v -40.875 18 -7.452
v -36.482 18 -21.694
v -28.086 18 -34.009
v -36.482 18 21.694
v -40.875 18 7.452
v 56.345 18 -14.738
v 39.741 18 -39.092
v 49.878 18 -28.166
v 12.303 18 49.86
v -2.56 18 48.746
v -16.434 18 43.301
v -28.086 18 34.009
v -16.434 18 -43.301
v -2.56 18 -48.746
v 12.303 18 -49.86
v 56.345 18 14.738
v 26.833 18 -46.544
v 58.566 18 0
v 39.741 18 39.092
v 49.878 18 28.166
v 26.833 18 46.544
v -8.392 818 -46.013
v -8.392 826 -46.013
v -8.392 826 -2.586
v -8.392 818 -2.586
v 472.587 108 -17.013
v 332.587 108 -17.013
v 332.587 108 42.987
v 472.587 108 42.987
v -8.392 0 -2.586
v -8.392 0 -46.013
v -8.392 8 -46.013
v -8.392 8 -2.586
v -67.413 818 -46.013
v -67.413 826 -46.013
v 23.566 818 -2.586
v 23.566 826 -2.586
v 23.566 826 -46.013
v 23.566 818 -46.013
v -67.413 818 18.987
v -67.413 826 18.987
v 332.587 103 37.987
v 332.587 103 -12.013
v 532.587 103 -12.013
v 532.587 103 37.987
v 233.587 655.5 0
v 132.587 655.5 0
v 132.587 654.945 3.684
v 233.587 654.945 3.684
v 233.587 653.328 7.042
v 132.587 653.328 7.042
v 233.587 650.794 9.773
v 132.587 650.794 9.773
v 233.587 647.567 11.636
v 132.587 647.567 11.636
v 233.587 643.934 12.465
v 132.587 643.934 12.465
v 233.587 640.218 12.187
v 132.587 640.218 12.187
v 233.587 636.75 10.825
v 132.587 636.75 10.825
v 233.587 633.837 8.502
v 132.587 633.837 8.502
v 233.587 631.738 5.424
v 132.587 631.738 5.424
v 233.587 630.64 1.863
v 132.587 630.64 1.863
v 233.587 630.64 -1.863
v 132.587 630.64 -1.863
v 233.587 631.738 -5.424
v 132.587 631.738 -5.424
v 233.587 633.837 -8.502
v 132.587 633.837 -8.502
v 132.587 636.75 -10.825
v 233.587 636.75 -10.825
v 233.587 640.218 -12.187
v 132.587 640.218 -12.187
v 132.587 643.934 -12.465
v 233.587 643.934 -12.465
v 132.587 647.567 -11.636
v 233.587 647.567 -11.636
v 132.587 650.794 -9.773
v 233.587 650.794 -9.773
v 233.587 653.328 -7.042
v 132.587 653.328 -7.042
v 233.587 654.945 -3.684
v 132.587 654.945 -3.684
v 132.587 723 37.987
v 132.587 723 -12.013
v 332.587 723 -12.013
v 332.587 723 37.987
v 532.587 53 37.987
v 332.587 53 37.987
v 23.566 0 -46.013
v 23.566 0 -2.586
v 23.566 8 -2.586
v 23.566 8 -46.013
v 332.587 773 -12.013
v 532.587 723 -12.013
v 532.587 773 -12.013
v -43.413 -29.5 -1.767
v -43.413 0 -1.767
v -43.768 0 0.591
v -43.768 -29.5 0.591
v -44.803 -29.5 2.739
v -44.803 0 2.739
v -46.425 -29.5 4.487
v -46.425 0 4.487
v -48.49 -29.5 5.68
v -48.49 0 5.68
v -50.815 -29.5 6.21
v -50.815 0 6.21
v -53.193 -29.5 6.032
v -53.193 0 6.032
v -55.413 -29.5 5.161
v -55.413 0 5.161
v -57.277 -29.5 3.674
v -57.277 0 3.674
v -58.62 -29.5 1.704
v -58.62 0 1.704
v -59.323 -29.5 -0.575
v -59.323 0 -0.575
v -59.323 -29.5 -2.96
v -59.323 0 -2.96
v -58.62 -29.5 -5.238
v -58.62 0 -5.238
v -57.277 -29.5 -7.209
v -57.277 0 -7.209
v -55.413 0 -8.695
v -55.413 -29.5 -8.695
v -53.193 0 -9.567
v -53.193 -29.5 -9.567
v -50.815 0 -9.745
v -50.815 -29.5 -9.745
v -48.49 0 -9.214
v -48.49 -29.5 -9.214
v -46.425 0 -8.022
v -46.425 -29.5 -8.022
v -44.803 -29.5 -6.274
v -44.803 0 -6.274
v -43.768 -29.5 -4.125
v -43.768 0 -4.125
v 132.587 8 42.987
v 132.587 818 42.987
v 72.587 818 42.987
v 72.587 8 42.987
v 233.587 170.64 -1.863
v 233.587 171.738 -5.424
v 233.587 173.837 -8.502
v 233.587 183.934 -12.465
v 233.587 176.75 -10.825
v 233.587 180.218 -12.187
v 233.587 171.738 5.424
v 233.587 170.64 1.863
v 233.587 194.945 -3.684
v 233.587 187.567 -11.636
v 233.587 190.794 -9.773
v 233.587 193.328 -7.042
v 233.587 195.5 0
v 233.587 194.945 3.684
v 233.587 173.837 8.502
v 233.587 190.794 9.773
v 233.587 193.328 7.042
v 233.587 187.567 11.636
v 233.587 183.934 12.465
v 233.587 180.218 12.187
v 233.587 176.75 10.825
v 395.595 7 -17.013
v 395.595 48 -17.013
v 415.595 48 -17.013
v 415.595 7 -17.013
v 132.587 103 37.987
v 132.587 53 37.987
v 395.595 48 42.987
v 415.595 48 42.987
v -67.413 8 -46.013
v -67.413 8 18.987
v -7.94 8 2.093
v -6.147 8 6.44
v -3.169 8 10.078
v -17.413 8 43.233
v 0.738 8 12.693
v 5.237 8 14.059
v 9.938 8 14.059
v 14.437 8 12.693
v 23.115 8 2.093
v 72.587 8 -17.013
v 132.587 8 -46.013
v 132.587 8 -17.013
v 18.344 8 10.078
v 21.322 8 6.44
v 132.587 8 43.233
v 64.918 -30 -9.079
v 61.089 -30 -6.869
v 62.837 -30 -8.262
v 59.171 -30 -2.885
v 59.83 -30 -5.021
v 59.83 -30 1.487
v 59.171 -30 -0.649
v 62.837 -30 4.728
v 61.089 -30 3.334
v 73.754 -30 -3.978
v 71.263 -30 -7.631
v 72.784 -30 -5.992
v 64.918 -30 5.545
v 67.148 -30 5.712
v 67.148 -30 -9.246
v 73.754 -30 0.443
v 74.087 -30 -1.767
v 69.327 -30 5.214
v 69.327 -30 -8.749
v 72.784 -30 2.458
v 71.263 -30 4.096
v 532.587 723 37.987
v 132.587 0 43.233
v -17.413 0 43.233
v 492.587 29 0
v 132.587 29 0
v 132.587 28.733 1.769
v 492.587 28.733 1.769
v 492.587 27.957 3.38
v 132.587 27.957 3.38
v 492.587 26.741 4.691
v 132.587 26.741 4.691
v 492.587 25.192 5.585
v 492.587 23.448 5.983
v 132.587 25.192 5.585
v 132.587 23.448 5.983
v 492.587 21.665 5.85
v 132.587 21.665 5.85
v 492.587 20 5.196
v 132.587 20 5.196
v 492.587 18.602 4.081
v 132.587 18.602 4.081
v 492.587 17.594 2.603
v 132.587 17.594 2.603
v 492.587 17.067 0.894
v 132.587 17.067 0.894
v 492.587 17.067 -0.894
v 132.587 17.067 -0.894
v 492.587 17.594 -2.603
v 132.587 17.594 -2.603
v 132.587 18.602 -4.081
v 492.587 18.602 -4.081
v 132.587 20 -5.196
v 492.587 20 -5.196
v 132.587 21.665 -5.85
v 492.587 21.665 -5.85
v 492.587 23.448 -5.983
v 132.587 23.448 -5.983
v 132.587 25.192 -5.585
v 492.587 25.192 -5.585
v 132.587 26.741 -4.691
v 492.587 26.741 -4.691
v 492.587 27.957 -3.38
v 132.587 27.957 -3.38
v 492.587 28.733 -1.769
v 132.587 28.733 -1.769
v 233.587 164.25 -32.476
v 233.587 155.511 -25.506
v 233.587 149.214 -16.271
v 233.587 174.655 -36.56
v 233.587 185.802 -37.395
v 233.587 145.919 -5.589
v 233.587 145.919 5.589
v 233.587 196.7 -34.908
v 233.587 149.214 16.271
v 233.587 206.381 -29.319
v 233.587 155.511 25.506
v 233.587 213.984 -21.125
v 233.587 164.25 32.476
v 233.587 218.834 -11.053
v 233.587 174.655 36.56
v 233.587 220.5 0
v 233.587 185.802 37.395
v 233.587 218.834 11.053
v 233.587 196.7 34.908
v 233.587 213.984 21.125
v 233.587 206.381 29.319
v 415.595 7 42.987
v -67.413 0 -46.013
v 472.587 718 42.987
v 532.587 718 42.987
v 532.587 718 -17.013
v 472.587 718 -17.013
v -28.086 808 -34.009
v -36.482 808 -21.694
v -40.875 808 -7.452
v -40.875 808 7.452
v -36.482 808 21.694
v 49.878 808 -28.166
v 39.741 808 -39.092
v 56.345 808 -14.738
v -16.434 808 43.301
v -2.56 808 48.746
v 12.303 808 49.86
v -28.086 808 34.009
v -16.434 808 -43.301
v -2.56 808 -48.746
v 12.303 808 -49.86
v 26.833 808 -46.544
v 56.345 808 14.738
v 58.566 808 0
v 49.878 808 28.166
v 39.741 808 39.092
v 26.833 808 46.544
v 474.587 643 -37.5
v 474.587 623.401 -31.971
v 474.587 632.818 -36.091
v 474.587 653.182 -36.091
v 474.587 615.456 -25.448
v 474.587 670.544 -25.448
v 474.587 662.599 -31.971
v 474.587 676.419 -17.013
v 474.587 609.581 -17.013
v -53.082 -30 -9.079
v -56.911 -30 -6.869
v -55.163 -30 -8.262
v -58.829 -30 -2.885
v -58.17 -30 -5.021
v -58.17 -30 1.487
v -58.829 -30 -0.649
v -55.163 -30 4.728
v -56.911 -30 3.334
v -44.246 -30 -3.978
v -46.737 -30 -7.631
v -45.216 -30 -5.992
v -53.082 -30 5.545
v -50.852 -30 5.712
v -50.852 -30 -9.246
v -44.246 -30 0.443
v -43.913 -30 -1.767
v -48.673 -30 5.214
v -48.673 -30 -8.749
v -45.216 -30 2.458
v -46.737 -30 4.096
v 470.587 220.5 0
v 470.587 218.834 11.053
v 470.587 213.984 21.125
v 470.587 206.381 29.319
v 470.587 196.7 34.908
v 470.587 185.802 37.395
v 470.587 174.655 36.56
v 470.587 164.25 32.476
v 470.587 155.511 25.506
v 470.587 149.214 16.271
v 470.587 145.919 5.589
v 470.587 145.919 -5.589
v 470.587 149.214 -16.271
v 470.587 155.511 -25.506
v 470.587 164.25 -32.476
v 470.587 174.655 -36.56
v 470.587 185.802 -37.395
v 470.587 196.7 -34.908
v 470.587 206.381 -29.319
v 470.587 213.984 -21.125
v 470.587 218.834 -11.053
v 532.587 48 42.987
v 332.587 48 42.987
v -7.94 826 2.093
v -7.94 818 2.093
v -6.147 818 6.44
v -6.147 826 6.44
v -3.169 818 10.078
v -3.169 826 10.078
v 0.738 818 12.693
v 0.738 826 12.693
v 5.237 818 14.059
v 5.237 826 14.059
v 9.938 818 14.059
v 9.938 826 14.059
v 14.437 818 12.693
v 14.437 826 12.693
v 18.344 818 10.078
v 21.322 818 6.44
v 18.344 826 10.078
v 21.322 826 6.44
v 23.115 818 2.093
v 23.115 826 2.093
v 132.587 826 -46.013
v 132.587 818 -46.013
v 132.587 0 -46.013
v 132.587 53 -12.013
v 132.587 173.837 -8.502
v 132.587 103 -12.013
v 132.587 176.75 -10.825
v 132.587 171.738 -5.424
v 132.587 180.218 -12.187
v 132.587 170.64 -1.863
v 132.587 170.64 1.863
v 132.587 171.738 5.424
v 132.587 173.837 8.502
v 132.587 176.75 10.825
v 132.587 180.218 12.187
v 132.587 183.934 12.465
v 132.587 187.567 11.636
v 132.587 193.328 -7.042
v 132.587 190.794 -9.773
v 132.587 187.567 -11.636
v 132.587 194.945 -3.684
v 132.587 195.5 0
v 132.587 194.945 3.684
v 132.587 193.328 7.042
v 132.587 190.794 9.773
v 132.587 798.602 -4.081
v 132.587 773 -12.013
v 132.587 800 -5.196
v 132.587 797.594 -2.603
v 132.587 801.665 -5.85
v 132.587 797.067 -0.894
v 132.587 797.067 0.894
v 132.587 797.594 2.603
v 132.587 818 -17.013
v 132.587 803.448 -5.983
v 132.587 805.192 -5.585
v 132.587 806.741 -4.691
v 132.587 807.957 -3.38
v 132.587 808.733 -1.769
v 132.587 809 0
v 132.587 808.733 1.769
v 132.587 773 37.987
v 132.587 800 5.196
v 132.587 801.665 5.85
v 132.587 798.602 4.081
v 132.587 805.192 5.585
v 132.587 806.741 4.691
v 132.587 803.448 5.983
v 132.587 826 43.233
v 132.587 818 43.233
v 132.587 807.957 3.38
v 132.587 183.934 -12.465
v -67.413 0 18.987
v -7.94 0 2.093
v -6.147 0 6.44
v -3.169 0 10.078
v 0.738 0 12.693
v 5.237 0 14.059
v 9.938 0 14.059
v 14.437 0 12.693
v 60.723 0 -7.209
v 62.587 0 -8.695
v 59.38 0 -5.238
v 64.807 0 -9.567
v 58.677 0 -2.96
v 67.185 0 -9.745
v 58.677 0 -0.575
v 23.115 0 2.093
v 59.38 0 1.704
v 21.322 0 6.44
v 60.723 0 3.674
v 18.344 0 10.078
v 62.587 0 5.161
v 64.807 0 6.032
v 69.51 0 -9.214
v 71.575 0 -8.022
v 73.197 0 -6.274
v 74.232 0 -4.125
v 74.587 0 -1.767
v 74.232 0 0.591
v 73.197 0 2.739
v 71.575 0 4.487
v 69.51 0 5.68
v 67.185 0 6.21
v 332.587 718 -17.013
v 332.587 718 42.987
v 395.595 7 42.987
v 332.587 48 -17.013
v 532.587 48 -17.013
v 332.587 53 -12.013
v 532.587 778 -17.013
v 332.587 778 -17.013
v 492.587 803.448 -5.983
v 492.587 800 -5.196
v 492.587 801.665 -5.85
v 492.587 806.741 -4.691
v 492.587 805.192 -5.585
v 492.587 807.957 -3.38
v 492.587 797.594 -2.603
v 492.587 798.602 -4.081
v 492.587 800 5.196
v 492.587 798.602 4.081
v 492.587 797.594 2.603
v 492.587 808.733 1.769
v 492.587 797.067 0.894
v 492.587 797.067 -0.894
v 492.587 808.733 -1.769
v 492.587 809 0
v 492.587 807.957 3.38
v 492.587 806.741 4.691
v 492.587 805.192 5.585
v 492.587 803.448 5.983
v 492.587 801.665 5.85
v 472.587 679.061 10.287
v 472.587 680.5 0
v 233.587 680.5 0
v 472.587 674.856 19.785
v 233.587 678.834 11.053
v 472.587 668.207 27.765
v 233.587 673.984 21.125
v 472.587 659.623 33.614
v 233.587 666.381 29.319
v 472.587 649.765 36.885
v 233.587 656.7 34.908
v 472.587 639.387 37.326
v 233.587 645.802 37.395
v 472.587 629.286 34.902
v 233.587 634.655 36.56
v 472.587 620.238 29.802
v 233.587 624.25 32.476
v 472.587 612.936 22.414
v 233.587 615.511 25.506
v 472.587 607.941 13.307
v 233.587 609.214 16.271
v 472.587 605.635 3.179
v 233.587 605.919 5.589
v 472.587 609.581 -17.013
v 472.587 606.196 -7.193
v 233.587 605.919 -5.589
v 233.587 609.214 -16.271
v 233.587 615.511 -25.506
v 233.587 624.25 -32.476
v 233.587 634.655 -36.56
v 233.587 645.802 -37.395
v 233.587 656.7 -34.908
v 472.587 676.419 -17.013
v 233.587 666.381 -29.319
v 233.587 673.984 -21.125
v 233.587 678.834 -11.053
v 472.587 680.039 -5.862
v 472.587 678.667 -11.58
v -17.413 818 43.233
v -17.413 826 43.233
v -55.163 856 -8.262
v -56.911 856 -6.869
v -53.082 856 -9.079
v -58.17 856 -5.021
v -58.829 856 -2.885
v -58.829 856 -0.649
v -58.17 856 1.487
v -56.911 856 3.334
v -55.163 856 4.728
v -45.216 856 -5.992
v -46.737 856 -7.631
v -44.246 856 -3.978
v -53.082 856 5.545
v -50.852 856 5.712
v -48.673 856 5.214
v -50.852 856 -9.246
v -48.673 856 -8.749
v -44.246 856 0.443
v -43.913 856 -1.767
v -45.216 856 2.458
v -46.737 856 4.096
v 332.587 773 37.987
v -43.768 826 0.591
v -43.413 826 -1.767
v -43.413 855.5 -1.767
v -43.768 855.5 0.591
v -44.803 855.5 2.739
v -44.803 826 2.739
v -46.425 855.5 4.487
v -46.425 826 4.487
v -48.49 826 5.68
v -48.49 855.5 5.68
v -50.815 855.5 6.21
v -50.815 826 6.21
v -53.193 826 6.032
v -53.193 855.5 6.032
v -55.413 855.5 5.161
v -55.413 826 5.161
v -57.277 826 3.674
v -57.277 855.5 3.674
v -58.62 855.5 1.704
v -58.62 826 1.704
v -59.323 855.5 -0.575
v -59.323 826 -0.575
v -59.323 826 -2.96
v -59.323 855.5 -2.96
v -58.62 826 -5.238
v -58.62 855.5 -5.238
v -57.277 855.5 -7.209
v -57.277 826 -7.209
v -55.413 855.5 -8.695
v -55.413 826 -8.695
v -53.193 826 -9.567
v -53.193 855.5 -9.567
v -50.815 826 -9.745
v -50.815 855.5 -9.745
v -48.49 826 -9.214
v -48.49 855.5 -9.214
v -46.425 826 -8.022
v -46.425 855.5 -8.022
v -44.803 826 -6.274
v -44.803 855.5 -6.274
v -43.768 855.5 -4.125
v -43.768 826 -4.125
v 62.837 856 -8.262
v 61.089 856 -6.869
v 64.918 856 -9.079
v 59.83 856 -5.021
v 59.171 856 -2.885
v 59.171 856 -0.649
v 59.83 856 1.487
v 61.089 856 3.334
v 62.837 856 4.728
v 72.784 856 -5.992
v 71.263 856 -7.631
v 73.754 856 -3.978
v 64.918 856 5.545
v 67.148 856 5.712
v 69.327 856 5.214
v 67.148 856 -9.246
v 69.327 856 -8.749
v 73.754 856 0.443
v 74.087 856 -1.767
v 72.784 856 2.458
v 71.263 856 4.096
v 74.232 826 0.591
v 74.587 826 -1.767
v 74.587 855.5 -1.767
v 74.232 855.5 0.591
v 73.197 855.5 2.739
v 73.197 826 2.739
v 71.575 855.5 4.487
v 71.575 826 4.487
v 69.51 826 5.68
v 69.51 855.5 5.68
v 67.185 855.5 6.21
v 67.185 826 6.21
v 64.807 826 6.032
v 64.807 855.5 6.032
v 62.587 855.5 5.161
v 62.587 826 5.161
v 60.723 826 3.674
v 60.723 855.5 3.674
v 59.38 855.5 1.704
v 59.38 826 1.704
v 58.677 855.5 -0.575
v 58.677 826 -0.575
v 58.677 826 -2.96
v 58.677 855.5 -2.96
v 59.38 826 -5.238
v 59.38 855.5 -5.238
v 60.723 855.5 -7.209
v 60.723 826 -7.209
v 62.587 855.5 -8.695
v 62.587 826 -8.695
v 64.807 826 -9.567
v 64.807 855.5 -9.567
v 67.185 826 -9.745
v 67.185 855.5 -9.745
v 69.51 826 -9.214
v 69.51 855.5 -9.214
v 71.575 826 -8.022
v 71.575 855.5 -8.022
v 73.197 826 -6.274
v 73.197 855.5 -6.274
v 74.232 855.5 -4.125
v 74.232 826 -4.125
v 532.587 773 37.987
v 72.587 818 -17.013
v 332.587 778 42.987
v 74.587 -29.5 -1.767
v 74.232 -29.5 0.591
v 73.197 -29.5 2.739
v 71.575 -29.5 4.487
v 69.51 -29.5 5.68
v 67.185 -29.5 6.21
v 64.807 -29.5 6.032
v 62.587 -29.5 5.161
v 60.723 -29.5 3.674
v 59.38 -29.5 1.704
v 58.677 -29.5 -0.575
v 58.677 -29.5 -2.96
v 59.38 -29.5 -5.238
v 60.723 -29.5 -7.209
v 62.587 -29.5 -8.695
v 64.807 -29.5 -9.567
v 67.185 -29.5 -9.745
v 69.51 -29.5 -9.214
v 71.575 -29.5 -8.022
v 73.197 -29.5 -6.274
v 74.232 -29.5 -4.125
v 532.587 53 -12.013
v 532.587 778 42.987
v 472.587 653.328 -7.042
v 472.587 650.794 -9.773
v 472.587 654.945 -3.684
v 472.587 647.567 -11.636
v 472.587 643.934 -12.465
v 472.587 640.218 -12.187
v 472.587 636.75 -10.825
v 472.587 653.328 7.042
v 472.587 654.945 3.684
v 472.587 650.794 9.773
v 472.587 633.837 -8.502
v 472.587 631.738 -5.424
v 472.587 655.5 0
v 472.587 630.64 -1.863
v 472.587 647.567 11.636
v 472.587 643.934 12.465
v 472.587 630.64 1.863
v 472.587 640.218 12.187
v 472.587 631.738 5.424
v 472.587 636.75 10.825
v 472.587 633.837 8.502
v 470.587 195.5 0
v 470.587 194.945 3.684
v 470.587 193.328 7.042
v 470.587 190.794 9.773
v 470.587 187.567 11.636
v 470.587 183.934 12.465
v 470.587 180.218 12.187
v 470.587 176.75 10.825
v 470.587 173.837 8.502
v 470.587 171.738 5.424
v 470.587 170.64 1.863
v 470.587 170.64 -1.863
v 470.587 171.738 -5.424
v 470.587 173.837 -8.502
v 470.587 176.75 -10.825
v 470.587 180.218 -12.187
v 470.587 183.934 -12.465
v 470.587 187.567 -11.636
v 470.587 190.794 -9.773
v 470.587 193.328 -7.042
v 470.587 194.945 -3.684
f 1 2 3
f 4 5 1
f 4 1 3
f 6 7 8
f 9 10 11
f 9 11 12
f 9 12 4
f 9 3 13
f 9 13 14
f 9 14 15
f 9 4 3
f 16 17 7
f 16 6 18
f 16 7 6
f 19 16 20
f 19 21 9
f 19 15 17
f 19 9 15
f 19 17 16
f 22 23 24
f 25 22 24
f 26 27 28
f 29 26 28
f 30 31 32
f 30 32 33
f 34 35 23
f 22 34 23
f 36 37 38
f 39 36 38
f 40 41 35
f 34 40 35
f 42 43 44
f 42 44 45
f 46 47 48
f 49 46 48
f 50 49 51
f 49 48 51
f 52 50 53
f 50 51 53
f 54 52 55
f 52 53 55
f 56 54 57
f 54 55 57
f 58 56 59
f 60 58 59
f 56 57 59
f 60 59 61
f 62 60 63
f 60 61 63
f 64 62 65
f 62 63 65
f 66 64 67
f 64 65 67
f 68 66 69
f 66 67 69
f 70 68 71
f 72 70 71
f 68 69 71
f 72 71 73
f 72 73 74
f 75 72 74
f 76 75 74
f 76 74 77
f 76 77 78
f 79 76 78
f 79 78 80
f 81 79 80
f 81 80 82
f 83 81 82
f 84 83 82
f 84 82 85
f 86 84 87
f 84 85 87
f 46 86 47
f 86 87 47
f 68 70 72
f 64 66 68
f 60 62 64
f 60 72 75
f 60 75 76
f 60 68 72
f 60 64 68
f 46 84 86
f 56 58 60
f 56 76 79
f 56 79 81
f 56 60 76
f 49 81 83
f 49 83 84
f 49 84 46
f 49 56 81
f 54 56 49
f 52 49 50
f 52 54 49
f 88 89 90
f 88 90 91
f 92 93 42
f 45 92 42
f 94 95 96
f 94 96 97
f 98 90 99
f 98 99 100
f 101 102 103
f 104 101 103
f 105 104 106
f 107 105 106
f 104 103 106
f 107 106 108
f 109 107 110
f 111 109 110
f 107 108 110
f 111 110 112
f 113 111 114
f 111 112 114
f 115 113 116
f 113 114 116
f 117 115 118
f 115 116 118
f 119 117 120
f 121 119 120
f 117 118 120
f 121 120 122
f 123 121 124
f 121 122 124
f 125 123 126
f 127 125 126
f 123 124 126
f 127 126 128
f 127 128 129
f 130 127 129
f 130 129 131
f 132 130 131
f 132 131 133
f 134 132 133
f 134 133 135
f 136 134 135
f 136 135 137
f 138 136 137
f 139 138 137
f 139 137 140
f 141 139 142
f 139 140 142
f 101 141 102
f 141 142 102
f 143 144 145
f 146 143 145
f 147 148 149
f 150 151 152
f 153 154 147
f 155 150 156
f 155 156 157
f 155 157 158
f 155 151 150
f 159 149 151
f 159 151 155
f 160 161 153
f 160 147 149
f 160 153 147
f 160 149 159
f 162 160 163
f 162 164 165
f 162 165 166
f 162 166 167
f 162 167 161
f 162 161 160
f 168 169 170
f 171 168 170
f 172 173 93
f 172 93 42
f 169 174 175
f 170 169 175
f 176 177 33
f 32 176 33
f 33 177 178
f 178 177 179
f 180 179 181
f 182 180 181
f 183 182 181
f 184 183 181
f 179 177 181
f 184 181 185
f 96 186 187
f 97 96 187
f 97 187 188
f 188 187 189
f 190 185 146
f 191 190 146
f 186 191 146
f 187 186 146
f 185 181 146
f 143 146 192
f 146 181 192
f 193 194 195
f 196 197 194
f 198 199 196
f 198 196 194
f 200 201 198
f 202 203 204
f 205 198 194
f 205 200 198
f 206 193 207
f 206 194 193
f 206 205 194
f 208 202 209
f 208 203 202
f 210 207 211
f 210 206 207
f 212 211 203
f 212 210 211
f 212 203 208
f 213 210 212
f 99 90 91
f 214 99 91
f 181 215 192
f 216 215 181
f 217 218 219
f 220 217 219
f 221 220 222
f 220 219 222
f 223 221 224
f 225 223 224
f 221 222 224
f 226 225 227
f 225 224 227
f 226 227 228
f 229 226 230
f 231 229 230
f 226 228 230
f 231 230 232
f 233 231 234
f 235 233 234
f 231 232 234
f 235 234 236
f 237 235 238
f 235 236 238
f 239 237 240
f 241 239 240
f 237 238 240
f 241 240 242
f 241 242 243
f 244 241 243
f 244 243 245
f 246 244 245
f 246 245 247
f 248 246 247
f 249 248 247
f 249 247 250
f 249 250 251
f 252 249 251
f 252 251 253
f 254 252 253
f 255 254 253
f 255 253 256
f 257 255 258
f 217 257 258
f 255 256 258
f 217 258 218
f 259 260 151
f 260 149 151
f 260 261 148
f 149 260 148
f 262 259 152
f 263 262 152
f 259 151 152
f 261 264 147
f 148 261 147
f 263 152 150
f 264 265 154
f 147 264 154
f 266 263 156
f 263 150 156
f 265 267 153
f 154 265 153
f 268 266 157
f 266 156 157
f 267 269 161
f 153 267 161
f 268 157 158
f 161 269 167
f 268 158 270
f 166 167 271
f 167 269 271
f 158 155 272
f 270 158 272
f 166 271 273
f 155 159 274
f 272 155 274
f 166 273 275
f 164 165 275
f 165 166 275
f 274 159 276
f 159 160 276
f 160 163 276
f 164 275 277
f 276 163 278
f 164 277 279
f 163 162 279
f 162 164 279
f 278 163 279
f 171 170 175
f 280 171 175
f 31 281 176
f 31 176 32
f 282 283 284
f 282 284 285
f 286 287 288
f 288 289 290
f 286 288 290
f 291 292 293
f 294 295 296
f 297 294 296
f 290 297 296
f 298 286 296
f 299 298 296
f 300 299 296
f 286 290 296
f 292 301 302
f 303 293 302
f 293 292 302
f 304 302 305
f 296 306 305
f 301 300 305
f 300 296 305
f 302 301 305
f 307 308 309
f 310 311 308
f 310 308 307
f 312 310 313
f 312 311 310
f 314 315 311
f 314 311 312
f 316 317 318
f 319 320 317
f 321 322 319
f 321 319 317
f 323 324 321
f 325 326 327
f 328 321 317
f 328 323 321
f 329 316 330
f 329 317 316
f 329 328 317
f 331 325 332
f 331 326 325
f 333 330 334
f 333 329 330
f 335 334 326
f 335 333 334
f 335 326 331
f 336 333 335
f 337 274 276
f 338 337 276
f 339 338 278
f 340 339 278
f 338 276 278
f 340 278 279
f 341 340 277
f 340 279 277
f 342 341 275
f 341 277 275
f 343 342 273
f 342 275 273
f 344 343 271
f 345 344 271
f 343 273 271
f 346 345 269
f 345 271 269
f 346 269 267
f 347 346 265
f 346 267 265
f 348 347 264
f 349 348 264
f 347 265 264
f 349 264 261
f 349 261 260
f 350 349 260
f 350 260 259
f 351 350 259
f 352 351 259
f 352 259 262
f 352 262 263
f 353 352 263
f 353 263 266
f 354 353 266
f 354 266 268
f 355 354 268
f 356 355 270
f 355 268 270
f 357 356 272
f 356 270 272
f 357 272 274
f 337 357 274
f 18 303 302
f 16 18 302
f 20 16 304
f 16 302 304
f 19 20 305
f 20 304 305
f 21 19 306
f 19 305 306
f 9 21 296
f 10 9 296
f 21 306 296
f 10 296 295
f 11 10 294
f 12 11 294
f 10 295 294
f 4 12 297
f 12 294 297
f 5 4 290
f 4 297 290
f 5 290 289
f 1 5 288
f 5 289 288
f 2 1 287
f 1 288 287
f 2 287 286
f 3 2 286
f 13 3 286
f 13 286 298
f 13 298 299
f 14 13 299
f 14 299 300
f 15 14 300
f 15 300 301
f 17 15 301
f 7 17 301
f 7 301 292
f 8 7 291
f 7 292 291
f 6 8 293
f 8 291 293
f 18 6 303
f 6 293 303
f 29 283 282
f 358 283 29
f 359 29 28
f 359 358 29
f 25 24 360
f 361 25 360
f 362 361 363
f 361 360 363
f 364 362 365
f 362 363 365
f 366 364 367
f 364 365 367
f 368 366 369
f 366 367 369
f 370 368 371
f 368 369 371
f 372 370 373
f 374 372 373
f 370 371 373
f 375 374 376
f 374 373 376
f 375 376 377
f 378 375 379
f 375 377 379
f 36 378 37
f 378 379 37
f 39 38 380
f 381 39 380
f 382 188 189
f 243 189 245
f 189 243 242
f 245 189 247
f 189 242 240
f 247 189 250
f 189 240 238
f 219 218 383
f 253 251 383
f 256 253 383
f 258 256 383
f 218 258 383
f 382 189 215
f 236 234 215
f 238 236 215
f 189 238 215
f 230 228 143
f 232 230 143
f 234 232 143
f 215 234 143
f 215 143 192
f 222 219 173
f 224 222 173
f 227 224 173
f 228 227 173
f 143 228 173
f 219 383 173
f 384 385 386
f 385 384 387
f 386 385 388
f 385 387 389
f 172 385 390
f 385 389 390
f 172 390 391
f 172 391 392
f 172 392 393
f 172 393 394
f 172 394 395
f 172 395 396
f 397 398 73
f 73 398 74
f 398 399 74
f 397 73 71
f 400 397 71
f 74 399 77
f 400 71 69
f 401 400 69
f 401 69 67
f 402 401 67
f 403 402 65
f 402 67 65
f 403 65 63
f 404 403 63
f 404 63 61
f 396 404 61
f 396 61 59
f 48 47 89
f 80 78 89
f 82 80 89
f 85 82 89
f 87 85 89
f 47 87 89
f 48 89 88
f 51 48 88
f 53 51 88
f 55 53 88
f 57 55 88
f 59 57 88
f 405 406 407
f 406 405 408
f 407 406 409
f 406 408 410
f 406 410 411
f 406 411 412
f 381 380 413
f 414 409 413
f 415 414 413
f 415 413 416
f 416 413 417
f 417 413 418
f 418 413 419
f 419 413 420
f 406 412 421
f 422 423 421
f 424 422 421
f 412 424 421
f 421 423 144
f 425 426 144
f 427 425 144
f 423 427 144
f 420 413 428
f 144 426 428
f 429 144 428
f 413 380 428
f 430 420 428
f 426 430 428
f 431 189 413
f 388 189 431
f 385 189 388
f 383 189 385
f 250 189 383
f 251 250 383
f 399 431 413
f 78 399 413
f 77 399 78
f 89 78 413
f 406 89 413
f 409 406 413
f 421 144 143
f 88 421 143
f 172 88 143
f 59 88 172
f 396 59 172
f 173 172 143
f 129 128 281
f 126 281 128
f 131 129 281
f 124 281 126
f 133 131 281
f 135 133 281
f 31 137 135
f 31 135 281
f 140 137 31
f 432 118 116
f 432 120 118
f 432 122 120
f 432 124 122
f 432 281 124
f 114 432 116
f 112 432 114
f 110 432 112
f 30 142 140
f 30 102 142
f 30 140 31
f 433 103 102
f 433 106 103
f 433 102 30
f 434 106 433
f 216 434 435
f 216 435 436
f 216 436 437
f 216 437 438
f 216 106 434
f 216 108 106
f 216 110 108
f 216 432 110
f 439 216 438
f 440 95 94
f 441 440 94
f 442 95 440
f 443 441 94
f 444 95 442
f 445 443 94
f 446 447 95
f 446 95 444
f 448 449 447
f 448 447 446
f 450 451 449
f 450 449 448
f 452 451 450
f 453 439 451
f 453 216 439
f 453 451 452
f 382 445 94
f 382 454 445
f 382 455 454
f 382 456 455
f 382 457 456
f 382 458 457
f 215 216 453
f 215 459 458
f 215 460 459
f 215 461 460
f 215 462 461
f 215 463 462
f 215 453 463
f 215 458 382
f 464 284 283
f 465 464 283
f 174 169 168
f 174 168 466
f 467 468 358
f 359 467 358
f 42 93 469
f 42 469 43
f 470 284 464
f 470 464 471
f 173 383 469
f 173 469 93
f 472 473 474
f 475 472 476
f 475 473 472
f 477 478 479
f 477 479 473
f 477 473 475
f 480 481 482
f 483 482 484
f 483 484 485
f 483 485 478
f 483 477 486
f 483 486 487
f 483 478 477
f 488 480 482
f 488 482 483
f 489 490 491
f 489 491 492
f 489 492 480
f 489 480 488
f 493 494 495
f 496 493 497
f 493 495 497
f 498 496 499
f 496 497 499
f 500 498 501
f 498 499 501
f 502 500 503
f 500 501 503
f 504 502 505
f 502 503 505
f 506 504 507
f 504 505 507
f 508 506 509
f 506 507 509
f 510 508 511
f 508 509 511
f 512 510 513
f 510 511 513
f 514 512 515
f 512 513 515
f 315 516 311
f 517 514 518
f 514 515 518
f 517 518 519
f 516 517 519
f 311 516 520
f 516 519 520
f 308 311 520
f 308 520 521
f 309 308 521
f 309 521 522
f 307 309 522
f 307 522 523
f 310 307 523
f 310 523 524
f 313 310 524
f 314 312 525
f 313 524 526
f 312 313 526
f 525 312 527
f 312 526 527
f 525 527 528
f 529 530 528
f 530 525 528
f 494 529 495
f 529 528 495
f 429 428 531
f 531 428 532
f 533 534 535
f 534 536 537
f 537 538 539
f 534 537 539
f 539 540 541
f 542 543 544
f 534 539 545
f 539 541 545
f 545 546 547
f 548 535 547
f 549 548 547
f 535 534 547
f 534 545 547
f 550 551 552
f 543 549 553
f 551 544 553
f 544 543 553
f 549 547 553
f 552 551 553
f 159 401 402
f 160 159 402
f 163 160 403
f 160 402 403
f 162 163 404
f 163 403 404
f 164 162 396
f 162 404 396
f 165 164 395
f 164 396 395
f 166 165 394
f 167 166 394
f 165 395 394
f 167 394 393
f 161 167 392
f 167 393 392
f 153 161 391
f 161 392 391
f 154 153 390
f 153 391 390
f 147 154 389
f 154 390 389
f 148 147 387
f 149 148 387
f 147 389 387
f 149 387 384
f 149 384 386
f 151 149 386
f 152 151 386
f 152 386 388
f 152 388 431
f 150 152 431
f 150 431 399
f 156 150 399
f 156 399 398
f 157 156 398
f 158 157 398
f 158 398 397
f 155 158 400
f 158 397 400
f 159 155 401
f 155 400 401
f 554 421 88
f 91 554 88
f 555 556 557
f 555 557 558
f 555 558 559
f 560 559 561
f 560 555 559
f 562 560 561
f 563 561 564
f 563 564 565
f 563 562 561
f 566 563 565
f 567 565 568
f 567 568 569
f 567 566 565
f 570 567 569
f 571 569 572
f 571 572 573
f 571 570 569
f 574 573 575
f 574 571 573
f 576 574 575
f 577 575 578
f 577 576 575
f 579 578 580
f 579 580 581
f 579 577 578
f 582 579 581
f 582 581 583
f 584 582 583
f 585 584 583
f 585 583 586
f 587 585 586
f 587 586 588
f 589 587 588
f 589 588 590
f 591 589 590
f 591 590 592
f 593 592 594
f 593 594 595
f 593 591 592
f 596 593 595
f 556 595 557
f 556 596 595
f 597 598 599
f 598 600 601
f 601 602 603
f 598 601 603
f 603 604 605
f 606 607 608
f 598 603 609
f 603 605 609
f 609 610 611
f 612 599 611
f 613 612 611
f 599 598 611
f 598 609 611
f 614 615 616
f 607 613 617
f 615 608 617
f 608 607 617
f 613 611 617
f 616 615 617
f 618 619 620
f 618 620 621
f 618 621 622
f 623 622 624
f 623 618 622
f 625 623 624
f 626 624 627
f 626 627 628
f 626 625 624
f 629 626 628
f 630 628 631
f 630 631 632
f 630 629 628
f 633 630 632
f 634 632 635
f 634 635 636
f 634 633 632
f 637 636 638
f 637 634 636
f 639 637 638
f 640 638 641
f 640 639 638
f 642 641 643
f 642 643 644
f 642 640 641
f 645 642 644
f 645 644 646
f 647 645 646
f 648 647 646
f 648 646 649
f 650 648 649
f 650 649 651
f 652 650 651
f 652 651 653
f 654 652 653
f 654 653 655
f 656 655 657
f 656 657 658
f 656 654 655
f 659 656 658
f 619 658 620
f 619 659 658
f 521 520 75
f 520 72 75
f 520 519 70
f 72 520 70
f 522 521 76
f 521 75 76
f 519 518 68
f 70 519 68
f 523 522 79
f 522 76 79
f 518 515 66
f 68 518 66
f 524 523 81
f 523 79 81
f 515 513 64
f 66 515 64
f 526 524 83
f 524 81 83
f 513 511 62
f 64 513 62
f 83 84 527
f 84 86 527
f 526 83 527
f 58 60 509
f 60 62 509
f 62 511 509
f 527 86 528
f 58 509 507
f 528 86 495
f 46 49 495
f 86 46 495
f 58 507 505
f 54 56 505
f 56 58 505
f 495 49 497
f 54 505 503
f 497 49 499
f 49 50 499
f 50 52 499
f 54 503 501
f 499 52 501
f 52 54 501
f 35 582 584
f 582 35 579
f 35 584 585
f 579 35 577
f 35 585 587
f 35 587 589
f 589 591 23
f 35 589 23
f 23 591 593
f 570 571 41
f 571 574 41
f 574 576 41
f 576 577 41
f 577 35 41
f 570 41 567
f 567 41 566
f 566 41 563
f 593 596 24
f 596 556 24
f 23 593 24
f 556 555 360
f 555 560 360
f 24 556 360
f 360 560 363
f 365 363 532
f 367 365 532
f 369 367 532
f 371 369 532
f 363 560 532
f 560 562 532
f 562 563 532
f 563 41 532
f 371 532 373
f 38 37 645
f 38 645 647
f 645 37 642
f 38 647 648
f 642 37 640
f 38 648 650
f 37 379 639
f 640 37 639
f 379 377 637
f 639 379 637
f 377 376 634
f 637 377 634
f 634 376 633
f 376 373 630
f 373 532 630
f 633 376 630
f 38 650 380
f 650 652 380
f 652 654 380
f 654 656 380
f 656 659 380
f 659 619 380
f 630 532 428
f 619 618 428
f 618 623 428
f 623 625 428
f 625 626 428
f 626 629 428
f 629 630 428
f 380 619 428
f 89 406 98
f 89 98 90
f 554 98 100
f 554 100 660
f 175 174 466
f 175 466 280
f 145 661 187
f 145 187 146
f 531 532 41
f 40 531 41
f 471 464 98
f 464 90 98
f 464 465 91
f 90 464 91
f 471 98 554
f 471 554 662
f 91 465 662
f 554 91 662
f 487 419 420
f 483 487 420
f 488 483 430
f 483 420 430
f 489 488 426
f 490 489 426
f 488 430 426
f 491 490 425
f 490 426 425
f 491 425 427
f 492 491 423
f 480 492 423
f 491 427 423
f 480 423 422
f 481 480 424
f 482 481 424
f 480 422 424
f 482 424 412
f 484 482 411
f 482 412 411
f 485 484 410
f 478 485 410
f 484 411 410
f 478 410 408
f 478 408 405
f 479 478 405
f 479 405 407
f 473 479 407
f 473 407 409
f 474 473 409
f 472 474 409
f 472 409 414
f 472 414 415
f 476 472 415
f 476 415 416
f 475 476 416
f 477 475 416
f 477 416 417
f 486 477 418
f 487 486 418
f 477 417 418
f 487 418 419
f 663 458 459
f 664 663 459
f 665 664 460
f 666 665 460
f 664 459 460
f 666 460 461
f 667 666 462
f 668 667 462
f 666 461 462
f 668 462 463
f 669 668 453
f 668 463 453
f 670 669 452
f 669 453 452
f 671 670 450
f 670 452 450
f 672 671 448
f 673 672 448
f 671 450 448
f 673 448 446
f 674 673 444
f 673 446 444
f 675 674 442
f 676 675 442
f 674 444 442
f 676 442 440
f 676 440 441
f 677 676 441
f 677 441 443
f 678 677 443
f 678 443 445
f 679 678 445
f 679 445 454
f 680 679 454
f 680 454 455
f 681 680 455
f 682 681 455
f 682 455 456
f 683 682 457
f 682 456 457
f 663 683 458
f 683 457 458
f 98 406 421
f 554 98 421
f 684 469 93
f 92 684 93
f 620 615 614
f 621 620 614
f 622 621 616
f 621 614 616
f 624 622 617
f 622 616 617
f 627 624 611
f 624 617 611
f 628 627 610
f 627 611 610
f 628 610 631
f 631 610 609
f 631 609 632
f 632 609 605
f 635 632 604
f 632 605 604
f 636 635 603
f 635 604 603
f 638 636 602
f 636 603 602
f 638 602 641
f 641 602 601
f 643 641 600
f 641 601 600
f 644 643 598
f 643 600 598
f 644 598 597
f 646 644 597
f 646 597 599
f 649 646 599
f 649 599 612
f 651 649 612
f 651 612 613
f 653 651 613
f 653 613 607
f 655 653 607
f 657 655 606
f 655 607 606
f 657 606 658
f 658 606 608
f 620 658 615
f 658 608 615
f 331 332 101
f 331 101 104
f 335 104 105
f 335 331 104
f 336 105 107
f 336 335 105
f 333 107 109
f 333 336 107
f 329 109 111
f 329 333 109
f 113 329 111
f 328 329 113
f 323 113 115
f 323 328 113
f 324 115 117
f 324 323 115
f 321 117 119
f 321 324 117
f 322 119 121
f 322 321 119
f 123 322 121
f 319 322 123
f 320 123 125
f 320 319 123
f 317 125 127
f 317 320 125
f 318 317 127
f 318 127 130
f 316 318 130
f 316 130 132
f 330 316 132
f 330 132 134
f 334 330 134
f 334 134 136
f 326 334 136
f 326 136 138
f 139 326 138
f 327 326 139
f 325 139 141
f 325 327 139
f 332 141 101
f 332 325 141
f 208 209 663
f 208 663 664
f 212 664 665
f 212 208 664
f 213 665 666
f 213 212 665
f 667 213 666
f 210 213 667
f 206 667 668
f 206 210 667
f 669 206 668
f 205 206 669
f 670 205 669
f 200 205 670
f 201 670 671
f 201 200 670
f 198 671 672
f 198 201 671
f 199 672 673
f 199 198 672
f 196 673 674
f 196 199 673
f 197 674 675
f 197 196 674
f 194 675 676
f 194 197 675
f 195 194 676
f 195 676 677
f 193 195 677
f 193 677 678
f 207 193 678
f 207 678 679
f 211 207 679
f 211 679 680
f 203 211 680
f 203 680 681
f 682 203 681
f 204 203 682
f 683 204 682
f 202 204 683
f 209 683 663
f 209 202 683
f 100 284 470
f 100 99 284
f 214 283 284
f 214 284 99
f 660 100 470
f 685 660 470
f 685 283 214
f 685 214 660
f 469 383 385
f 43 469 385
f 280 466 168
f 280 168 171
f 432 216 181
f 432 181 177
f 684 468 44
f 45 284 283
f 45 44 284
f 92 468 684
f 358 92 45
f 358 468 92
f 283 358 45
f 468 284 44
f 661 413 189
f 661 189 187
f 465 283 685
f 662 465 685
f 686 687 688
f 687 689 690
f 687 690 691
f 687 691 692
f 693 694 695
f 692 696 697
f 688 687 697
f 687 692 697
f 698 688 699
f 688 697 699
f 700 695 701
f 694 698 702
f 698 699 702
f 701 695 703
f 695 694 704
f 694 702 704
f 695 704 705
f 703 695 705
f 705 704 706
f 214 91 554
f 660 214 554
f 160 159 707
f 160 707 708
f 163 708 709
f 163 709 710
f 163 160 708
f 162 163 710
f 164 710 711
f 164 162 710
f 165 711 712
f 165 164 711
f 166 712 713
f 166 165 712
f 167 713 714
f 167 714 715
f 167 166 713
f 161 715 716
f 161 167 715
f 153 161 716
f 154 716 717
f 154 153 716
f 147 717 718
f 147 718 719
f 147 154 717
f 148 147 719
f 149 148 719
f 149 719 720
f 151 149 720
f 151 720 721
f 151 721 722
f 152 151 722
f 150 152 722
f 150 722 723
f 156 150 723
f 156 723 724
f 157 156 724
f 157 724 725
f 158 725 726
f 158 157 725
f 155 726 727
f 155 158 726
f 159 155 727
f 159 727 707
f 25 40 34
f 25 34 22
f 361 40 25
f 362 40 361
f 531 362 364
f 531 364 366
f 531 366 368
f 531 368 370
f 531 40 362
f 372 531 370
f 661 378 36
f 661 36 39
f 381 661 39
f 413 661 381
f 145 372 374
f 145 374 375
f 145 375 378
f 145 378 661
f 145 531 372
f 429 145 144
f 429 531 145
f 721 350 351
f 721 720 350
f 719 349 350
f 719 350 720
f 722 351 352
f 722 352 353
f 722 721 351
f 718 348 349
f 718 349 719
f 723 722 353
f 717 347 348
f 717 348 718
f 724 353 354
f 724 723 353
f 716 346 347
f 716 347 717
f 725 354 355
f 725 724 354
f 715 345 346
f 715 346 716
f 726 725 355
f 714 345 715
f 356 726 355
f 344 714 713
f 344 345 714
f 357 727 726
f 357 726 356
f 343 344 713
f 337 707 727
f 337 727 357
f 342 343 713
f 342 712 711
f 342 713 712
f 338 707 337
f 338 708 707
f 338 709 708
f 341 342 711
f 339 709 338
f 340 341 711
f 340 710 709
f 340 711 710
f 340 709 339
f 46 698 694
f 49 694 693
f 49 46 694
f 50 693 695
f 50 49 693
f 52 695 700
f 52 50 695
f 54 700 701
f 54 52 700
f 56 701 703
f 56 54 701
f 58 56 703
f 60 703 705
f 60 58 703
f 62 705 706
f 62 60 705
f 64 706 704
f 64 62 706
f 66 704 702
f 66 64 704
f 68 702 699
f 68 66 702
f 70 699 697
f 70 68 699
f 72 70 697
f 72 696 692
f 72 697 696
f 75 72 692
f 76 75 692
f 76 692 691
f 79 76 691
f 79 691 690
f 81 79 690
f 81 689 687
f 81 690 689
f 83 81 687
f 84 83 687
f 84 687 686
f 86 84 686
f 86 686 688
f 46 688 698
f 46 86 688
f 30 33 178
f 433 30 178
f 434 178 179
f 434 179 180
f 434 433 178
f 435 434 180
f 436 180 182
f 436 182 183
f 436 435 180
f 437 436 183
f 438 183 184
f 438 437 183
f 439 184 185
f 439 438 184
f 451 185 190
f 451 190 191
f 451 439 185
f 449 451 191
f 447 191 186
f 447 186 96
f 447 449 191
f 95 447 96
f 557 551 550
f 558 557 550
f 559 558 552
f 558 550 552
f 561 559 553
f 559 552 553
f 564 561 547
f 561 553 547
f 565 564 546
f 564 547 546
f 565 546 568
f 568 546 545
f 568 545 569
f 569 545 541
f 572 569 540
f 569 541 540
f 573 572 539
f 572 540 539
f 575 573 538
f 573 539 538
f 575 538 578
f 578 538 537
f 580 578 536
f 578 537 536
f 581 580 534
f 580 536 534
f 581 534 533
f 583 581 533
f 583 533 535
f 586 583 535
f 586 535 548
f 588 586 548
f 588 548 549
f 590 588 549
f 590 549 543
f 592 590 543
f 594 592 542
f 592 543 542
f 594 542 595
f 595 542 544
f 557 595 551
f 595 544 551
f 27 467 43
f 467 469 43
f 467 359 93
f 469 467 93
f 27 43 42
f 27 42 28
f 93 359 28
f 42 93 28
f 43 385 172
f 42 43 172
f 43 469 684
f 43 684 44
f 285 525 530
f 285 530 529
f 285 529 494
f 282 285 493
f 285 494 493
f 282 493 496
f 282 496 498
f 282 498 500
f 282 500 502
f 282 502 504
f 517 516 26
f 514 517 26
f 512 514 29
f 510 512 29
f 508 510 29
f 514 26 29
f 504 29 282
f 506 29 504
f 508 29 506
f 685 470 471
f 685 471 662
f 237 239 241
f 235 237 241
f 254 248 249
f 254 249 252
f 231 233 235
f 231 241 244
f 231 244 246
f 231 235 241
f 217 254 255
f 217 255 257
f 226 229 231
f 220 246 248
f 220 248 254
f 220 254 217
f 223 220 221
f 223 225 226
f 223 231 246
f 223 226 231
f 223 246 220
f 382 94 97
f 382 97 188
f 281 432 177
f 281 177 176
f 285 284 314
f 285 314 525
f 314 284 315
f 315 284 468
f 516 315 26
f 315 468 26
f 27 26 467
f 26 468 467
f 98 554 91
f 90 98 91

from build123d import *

# Parameters (mm, degrees)
F1_DEPTH  = 8
F2_R      = 8
F3_DEPTH  = 30
F4_SIZE   = 0.5
F5_W      = 60
F5_H      = 60
F6_DEPTH  = 405
F7_W      = 50
F7_H      = 50
F8_DEPTH  = 200
F10_W     = 60
F10_H     = 60
F10_W_2   = 50
F10_H_2   = 50
F11_DEPTH = 200
F13_W     = 60
F13_H     = 60
F14_DEPTH = 610
F15_W     = 60
F15_H     = 60
F15_W_2   = 50
F15_H_2   = 50
F16_DEPTH = 200
F17_R     = 6
F18_DEPTH = 360
F19_DEPTH = 360
F20_W     = 20
F20_H     = 60
F21_DEPTH = 41
F22_R     = 12.5
F23_DEPTH = 101
F24_R     = 37.5
F24_R_2   = 12.5
F25_DEPTH = 237
F26_R     = 12.5
F27_DEPTH = 101
F28_R     = 37.5
F28_R_2   = 12.5
F29_DEPTH = 241
F31_R     = 50
F32_DEPTH = 790


with BuildPart() as f1:
    # F0 (on Front) → F1 (new body)
    with BuildSketch(Plane.XZ):
        with BuildLine():
            Line((132.5873207722, 43.2327152074), (-17.4126792278, 43.2327152074))
            Line((-17.4126792278, 43.2327152074), (-67.4126792278, 18.9871956075))
            Line((-67.4126792278, 18.9871956075), (-67.4126792278, -46.0128043925))
            Line((-67.4126792278, -46.0128043925), (-8.3917075603, -46.0128043925))
            Line((-8.3917075603, -46.0128043925), (-8.3917075603, -2.5862191913))
            ThreePointArc((-8.3917075603, -2.5862191913), (7.5873207722, 14.2327152074), (23.5663491047, -2.5862191913))
            Line((23.5663491047, -2.5862191913), (23.5663491047, -46.0128043925))
            Line((23.5663491047, -46.0128043925), (132.5873207722, -46.0128043925))
            Line((132.5873207722, -46.0128043925), (132.5873207722, 43.2327152074))
        make_face()
    extrude(amount=-F1_DEPTH)

    # F2 (on face) → F3 (join)
    with BuildSketch(Plane.XZ):
        with Locations((-51.4126792278, -1.7672847926)):
            Circle(F2_R)
        with Locations((66.5873207722, -1.7672847926)):
            Circle(F2_R)
    extrude(amount=F3_DEPTH)

    # F4
    f4_edges = [f1.edges().sort_by_distance(p)[0] for p in [
        (-59.412679, -30, -1.767285),
        (58.587321, -30, -1.767285),
    ]]
    chamfer(f4_edges, length=F4_SIZE)

    # F5 (on face) → F6 (join)
    with BuildSketch(Plane(origin=(0, 8, 0), x_dir=(-1, 0, 0), z_dir=(0, 1, 0))):
        with Locations((-102.5873207722, 12.9871956075)):
            Rectangle(F5_W, F5_H)
    extrude(amount=F6_DEPTH)

    # F7 (on face) → F8 (join)
    with BuildSketch(Plane.YZ.offset(132.5873207722)):
        with Locations((78, 12.9871956075)):
            Rectangle(F7_W, F7_H)
    extrude(amount=F8_DEPTH)

    # F12: F1 across face


with BuildPart() as f11:
    # F10 (on face) → F11 (new body)
    with BuildSketch(Plane.YZ.offset(332.5873207722)):
        with Locations((78, 12.9871956075)):
            Rectangle(F10_W, F10_H)
        with Locations((78, 12.9871956075)):
            Rectangle(F10_W_2, F10_H_2, mode=Mode.SUBTRACT)
    extrude(amount=F11_DEPTH)

    # F13 (on face) → F14 (join)
    with BuildSketch(Plane(origin=(0, 108, 0), x_dir=(-1, 0, 0), z_dir=(0, 1, 0))):
        with Locations((-502.5873207722, 12.9871956075)):
            Rectangle(F13_W, F13_H)
    extrude(amount=F14_DEPTH)


with BuildPart() as f1_1:
    add(f1.part)
    add(f1.part.mirror(Plane(origin=(102.5873207722, 413, 12.9871956075), x_dir=(-1, 0, 0), z_dir=(0, 1, 0))))

    # F17 (on face) → F18 (join)
    with BuildSketch(Plane.YZ.offset(132.5873207722)):
        with Locations((23, 0)):
            Circle(F17_R)
    extrude(amount=F18_DEPTH)

    # F17 (on face) → F19 (join)
    with BuildSketch(Plane.YZ.offset(132.5873207722)):
        with Locations((803, 0)):
            Circle(F17_R)
    extrude(amount=F19_DEPTH)

    # F22 (on face) → F23 (join)
    with BuildSketch(Plane.YZ.offset(132.5873207722)):
        with Locations((183, 0)):
            Circle(F22_R)
    extrude(amount=F23_DEPTH)

    # F26 (on face) → F27 (join)
    with BuildSketch(Plane.YZ.offset(132.5873207722)):
        with Locations((643, 0)):
            Circle(F26_R)
    extrude(amount=F27_DEPTH)


    add(f11.part)  # F29 merges F11
    # F28 (on face) → F29 (join)
    with BuildSketch(Plane.YZ.offset(233.5873207722)):
        with Locations((643, 0)):
            Circle(F28_R)
        with Locations((643, 0)):
            Circle(F28_R_2, mode=Mode.SUBTRACT)
    extrude(amount=F29_DEPTH)


with BuildPart() as f16:
    # F15 (on face) → F16 (new body)
    with BuildSketch(Plane.YZ.offset(332.5873207722)):
        with Locations((748, 12.9871956075)):
            Rectangle(F15_W, F15_H)
        with Locations((748, 12.9871956075)):
            Rectangle(F15_W_2, F15_H_2, mode=Mode.SUBTRACT)
    extrude(amount=F16_DEPTH)


with BuildPart() as f21:
    # F20 (on face) → F21 (new body)
    with BuildSketch(Plane.XZ.offset(-48)):
        with Locations((405.5948352814, 12.9871956075)):
            Rectangle(F20_W, F20_H)
    extrude(amount=F21_DEPTH)


with BuildPart() as f25:
    # F24 (on face) → F25 (new body)
    with BuildSketch(Plane.YZ.offset(233.5873207722)):
        with Locations((183, 0)):
            Circle(F24_R)
        with Locations((183, 0)):
            Circle(F24_R_2, mode=Mode.SUBTRACT)
    extrude(amount=F25_DEPTH)


with BuildPart() as f32:
    # F31 (on offset) → F32 (new body)
    with BuildSketch(Plane.XZ.offset(-808)):
        with Locations((8.5663491047, 0)):
            Circle(F31_R)
    extrude(amount=F32_DEPTH)


solid = Compound([f1_1.part, f16.part, f21.part, f25.part, f32.part])
